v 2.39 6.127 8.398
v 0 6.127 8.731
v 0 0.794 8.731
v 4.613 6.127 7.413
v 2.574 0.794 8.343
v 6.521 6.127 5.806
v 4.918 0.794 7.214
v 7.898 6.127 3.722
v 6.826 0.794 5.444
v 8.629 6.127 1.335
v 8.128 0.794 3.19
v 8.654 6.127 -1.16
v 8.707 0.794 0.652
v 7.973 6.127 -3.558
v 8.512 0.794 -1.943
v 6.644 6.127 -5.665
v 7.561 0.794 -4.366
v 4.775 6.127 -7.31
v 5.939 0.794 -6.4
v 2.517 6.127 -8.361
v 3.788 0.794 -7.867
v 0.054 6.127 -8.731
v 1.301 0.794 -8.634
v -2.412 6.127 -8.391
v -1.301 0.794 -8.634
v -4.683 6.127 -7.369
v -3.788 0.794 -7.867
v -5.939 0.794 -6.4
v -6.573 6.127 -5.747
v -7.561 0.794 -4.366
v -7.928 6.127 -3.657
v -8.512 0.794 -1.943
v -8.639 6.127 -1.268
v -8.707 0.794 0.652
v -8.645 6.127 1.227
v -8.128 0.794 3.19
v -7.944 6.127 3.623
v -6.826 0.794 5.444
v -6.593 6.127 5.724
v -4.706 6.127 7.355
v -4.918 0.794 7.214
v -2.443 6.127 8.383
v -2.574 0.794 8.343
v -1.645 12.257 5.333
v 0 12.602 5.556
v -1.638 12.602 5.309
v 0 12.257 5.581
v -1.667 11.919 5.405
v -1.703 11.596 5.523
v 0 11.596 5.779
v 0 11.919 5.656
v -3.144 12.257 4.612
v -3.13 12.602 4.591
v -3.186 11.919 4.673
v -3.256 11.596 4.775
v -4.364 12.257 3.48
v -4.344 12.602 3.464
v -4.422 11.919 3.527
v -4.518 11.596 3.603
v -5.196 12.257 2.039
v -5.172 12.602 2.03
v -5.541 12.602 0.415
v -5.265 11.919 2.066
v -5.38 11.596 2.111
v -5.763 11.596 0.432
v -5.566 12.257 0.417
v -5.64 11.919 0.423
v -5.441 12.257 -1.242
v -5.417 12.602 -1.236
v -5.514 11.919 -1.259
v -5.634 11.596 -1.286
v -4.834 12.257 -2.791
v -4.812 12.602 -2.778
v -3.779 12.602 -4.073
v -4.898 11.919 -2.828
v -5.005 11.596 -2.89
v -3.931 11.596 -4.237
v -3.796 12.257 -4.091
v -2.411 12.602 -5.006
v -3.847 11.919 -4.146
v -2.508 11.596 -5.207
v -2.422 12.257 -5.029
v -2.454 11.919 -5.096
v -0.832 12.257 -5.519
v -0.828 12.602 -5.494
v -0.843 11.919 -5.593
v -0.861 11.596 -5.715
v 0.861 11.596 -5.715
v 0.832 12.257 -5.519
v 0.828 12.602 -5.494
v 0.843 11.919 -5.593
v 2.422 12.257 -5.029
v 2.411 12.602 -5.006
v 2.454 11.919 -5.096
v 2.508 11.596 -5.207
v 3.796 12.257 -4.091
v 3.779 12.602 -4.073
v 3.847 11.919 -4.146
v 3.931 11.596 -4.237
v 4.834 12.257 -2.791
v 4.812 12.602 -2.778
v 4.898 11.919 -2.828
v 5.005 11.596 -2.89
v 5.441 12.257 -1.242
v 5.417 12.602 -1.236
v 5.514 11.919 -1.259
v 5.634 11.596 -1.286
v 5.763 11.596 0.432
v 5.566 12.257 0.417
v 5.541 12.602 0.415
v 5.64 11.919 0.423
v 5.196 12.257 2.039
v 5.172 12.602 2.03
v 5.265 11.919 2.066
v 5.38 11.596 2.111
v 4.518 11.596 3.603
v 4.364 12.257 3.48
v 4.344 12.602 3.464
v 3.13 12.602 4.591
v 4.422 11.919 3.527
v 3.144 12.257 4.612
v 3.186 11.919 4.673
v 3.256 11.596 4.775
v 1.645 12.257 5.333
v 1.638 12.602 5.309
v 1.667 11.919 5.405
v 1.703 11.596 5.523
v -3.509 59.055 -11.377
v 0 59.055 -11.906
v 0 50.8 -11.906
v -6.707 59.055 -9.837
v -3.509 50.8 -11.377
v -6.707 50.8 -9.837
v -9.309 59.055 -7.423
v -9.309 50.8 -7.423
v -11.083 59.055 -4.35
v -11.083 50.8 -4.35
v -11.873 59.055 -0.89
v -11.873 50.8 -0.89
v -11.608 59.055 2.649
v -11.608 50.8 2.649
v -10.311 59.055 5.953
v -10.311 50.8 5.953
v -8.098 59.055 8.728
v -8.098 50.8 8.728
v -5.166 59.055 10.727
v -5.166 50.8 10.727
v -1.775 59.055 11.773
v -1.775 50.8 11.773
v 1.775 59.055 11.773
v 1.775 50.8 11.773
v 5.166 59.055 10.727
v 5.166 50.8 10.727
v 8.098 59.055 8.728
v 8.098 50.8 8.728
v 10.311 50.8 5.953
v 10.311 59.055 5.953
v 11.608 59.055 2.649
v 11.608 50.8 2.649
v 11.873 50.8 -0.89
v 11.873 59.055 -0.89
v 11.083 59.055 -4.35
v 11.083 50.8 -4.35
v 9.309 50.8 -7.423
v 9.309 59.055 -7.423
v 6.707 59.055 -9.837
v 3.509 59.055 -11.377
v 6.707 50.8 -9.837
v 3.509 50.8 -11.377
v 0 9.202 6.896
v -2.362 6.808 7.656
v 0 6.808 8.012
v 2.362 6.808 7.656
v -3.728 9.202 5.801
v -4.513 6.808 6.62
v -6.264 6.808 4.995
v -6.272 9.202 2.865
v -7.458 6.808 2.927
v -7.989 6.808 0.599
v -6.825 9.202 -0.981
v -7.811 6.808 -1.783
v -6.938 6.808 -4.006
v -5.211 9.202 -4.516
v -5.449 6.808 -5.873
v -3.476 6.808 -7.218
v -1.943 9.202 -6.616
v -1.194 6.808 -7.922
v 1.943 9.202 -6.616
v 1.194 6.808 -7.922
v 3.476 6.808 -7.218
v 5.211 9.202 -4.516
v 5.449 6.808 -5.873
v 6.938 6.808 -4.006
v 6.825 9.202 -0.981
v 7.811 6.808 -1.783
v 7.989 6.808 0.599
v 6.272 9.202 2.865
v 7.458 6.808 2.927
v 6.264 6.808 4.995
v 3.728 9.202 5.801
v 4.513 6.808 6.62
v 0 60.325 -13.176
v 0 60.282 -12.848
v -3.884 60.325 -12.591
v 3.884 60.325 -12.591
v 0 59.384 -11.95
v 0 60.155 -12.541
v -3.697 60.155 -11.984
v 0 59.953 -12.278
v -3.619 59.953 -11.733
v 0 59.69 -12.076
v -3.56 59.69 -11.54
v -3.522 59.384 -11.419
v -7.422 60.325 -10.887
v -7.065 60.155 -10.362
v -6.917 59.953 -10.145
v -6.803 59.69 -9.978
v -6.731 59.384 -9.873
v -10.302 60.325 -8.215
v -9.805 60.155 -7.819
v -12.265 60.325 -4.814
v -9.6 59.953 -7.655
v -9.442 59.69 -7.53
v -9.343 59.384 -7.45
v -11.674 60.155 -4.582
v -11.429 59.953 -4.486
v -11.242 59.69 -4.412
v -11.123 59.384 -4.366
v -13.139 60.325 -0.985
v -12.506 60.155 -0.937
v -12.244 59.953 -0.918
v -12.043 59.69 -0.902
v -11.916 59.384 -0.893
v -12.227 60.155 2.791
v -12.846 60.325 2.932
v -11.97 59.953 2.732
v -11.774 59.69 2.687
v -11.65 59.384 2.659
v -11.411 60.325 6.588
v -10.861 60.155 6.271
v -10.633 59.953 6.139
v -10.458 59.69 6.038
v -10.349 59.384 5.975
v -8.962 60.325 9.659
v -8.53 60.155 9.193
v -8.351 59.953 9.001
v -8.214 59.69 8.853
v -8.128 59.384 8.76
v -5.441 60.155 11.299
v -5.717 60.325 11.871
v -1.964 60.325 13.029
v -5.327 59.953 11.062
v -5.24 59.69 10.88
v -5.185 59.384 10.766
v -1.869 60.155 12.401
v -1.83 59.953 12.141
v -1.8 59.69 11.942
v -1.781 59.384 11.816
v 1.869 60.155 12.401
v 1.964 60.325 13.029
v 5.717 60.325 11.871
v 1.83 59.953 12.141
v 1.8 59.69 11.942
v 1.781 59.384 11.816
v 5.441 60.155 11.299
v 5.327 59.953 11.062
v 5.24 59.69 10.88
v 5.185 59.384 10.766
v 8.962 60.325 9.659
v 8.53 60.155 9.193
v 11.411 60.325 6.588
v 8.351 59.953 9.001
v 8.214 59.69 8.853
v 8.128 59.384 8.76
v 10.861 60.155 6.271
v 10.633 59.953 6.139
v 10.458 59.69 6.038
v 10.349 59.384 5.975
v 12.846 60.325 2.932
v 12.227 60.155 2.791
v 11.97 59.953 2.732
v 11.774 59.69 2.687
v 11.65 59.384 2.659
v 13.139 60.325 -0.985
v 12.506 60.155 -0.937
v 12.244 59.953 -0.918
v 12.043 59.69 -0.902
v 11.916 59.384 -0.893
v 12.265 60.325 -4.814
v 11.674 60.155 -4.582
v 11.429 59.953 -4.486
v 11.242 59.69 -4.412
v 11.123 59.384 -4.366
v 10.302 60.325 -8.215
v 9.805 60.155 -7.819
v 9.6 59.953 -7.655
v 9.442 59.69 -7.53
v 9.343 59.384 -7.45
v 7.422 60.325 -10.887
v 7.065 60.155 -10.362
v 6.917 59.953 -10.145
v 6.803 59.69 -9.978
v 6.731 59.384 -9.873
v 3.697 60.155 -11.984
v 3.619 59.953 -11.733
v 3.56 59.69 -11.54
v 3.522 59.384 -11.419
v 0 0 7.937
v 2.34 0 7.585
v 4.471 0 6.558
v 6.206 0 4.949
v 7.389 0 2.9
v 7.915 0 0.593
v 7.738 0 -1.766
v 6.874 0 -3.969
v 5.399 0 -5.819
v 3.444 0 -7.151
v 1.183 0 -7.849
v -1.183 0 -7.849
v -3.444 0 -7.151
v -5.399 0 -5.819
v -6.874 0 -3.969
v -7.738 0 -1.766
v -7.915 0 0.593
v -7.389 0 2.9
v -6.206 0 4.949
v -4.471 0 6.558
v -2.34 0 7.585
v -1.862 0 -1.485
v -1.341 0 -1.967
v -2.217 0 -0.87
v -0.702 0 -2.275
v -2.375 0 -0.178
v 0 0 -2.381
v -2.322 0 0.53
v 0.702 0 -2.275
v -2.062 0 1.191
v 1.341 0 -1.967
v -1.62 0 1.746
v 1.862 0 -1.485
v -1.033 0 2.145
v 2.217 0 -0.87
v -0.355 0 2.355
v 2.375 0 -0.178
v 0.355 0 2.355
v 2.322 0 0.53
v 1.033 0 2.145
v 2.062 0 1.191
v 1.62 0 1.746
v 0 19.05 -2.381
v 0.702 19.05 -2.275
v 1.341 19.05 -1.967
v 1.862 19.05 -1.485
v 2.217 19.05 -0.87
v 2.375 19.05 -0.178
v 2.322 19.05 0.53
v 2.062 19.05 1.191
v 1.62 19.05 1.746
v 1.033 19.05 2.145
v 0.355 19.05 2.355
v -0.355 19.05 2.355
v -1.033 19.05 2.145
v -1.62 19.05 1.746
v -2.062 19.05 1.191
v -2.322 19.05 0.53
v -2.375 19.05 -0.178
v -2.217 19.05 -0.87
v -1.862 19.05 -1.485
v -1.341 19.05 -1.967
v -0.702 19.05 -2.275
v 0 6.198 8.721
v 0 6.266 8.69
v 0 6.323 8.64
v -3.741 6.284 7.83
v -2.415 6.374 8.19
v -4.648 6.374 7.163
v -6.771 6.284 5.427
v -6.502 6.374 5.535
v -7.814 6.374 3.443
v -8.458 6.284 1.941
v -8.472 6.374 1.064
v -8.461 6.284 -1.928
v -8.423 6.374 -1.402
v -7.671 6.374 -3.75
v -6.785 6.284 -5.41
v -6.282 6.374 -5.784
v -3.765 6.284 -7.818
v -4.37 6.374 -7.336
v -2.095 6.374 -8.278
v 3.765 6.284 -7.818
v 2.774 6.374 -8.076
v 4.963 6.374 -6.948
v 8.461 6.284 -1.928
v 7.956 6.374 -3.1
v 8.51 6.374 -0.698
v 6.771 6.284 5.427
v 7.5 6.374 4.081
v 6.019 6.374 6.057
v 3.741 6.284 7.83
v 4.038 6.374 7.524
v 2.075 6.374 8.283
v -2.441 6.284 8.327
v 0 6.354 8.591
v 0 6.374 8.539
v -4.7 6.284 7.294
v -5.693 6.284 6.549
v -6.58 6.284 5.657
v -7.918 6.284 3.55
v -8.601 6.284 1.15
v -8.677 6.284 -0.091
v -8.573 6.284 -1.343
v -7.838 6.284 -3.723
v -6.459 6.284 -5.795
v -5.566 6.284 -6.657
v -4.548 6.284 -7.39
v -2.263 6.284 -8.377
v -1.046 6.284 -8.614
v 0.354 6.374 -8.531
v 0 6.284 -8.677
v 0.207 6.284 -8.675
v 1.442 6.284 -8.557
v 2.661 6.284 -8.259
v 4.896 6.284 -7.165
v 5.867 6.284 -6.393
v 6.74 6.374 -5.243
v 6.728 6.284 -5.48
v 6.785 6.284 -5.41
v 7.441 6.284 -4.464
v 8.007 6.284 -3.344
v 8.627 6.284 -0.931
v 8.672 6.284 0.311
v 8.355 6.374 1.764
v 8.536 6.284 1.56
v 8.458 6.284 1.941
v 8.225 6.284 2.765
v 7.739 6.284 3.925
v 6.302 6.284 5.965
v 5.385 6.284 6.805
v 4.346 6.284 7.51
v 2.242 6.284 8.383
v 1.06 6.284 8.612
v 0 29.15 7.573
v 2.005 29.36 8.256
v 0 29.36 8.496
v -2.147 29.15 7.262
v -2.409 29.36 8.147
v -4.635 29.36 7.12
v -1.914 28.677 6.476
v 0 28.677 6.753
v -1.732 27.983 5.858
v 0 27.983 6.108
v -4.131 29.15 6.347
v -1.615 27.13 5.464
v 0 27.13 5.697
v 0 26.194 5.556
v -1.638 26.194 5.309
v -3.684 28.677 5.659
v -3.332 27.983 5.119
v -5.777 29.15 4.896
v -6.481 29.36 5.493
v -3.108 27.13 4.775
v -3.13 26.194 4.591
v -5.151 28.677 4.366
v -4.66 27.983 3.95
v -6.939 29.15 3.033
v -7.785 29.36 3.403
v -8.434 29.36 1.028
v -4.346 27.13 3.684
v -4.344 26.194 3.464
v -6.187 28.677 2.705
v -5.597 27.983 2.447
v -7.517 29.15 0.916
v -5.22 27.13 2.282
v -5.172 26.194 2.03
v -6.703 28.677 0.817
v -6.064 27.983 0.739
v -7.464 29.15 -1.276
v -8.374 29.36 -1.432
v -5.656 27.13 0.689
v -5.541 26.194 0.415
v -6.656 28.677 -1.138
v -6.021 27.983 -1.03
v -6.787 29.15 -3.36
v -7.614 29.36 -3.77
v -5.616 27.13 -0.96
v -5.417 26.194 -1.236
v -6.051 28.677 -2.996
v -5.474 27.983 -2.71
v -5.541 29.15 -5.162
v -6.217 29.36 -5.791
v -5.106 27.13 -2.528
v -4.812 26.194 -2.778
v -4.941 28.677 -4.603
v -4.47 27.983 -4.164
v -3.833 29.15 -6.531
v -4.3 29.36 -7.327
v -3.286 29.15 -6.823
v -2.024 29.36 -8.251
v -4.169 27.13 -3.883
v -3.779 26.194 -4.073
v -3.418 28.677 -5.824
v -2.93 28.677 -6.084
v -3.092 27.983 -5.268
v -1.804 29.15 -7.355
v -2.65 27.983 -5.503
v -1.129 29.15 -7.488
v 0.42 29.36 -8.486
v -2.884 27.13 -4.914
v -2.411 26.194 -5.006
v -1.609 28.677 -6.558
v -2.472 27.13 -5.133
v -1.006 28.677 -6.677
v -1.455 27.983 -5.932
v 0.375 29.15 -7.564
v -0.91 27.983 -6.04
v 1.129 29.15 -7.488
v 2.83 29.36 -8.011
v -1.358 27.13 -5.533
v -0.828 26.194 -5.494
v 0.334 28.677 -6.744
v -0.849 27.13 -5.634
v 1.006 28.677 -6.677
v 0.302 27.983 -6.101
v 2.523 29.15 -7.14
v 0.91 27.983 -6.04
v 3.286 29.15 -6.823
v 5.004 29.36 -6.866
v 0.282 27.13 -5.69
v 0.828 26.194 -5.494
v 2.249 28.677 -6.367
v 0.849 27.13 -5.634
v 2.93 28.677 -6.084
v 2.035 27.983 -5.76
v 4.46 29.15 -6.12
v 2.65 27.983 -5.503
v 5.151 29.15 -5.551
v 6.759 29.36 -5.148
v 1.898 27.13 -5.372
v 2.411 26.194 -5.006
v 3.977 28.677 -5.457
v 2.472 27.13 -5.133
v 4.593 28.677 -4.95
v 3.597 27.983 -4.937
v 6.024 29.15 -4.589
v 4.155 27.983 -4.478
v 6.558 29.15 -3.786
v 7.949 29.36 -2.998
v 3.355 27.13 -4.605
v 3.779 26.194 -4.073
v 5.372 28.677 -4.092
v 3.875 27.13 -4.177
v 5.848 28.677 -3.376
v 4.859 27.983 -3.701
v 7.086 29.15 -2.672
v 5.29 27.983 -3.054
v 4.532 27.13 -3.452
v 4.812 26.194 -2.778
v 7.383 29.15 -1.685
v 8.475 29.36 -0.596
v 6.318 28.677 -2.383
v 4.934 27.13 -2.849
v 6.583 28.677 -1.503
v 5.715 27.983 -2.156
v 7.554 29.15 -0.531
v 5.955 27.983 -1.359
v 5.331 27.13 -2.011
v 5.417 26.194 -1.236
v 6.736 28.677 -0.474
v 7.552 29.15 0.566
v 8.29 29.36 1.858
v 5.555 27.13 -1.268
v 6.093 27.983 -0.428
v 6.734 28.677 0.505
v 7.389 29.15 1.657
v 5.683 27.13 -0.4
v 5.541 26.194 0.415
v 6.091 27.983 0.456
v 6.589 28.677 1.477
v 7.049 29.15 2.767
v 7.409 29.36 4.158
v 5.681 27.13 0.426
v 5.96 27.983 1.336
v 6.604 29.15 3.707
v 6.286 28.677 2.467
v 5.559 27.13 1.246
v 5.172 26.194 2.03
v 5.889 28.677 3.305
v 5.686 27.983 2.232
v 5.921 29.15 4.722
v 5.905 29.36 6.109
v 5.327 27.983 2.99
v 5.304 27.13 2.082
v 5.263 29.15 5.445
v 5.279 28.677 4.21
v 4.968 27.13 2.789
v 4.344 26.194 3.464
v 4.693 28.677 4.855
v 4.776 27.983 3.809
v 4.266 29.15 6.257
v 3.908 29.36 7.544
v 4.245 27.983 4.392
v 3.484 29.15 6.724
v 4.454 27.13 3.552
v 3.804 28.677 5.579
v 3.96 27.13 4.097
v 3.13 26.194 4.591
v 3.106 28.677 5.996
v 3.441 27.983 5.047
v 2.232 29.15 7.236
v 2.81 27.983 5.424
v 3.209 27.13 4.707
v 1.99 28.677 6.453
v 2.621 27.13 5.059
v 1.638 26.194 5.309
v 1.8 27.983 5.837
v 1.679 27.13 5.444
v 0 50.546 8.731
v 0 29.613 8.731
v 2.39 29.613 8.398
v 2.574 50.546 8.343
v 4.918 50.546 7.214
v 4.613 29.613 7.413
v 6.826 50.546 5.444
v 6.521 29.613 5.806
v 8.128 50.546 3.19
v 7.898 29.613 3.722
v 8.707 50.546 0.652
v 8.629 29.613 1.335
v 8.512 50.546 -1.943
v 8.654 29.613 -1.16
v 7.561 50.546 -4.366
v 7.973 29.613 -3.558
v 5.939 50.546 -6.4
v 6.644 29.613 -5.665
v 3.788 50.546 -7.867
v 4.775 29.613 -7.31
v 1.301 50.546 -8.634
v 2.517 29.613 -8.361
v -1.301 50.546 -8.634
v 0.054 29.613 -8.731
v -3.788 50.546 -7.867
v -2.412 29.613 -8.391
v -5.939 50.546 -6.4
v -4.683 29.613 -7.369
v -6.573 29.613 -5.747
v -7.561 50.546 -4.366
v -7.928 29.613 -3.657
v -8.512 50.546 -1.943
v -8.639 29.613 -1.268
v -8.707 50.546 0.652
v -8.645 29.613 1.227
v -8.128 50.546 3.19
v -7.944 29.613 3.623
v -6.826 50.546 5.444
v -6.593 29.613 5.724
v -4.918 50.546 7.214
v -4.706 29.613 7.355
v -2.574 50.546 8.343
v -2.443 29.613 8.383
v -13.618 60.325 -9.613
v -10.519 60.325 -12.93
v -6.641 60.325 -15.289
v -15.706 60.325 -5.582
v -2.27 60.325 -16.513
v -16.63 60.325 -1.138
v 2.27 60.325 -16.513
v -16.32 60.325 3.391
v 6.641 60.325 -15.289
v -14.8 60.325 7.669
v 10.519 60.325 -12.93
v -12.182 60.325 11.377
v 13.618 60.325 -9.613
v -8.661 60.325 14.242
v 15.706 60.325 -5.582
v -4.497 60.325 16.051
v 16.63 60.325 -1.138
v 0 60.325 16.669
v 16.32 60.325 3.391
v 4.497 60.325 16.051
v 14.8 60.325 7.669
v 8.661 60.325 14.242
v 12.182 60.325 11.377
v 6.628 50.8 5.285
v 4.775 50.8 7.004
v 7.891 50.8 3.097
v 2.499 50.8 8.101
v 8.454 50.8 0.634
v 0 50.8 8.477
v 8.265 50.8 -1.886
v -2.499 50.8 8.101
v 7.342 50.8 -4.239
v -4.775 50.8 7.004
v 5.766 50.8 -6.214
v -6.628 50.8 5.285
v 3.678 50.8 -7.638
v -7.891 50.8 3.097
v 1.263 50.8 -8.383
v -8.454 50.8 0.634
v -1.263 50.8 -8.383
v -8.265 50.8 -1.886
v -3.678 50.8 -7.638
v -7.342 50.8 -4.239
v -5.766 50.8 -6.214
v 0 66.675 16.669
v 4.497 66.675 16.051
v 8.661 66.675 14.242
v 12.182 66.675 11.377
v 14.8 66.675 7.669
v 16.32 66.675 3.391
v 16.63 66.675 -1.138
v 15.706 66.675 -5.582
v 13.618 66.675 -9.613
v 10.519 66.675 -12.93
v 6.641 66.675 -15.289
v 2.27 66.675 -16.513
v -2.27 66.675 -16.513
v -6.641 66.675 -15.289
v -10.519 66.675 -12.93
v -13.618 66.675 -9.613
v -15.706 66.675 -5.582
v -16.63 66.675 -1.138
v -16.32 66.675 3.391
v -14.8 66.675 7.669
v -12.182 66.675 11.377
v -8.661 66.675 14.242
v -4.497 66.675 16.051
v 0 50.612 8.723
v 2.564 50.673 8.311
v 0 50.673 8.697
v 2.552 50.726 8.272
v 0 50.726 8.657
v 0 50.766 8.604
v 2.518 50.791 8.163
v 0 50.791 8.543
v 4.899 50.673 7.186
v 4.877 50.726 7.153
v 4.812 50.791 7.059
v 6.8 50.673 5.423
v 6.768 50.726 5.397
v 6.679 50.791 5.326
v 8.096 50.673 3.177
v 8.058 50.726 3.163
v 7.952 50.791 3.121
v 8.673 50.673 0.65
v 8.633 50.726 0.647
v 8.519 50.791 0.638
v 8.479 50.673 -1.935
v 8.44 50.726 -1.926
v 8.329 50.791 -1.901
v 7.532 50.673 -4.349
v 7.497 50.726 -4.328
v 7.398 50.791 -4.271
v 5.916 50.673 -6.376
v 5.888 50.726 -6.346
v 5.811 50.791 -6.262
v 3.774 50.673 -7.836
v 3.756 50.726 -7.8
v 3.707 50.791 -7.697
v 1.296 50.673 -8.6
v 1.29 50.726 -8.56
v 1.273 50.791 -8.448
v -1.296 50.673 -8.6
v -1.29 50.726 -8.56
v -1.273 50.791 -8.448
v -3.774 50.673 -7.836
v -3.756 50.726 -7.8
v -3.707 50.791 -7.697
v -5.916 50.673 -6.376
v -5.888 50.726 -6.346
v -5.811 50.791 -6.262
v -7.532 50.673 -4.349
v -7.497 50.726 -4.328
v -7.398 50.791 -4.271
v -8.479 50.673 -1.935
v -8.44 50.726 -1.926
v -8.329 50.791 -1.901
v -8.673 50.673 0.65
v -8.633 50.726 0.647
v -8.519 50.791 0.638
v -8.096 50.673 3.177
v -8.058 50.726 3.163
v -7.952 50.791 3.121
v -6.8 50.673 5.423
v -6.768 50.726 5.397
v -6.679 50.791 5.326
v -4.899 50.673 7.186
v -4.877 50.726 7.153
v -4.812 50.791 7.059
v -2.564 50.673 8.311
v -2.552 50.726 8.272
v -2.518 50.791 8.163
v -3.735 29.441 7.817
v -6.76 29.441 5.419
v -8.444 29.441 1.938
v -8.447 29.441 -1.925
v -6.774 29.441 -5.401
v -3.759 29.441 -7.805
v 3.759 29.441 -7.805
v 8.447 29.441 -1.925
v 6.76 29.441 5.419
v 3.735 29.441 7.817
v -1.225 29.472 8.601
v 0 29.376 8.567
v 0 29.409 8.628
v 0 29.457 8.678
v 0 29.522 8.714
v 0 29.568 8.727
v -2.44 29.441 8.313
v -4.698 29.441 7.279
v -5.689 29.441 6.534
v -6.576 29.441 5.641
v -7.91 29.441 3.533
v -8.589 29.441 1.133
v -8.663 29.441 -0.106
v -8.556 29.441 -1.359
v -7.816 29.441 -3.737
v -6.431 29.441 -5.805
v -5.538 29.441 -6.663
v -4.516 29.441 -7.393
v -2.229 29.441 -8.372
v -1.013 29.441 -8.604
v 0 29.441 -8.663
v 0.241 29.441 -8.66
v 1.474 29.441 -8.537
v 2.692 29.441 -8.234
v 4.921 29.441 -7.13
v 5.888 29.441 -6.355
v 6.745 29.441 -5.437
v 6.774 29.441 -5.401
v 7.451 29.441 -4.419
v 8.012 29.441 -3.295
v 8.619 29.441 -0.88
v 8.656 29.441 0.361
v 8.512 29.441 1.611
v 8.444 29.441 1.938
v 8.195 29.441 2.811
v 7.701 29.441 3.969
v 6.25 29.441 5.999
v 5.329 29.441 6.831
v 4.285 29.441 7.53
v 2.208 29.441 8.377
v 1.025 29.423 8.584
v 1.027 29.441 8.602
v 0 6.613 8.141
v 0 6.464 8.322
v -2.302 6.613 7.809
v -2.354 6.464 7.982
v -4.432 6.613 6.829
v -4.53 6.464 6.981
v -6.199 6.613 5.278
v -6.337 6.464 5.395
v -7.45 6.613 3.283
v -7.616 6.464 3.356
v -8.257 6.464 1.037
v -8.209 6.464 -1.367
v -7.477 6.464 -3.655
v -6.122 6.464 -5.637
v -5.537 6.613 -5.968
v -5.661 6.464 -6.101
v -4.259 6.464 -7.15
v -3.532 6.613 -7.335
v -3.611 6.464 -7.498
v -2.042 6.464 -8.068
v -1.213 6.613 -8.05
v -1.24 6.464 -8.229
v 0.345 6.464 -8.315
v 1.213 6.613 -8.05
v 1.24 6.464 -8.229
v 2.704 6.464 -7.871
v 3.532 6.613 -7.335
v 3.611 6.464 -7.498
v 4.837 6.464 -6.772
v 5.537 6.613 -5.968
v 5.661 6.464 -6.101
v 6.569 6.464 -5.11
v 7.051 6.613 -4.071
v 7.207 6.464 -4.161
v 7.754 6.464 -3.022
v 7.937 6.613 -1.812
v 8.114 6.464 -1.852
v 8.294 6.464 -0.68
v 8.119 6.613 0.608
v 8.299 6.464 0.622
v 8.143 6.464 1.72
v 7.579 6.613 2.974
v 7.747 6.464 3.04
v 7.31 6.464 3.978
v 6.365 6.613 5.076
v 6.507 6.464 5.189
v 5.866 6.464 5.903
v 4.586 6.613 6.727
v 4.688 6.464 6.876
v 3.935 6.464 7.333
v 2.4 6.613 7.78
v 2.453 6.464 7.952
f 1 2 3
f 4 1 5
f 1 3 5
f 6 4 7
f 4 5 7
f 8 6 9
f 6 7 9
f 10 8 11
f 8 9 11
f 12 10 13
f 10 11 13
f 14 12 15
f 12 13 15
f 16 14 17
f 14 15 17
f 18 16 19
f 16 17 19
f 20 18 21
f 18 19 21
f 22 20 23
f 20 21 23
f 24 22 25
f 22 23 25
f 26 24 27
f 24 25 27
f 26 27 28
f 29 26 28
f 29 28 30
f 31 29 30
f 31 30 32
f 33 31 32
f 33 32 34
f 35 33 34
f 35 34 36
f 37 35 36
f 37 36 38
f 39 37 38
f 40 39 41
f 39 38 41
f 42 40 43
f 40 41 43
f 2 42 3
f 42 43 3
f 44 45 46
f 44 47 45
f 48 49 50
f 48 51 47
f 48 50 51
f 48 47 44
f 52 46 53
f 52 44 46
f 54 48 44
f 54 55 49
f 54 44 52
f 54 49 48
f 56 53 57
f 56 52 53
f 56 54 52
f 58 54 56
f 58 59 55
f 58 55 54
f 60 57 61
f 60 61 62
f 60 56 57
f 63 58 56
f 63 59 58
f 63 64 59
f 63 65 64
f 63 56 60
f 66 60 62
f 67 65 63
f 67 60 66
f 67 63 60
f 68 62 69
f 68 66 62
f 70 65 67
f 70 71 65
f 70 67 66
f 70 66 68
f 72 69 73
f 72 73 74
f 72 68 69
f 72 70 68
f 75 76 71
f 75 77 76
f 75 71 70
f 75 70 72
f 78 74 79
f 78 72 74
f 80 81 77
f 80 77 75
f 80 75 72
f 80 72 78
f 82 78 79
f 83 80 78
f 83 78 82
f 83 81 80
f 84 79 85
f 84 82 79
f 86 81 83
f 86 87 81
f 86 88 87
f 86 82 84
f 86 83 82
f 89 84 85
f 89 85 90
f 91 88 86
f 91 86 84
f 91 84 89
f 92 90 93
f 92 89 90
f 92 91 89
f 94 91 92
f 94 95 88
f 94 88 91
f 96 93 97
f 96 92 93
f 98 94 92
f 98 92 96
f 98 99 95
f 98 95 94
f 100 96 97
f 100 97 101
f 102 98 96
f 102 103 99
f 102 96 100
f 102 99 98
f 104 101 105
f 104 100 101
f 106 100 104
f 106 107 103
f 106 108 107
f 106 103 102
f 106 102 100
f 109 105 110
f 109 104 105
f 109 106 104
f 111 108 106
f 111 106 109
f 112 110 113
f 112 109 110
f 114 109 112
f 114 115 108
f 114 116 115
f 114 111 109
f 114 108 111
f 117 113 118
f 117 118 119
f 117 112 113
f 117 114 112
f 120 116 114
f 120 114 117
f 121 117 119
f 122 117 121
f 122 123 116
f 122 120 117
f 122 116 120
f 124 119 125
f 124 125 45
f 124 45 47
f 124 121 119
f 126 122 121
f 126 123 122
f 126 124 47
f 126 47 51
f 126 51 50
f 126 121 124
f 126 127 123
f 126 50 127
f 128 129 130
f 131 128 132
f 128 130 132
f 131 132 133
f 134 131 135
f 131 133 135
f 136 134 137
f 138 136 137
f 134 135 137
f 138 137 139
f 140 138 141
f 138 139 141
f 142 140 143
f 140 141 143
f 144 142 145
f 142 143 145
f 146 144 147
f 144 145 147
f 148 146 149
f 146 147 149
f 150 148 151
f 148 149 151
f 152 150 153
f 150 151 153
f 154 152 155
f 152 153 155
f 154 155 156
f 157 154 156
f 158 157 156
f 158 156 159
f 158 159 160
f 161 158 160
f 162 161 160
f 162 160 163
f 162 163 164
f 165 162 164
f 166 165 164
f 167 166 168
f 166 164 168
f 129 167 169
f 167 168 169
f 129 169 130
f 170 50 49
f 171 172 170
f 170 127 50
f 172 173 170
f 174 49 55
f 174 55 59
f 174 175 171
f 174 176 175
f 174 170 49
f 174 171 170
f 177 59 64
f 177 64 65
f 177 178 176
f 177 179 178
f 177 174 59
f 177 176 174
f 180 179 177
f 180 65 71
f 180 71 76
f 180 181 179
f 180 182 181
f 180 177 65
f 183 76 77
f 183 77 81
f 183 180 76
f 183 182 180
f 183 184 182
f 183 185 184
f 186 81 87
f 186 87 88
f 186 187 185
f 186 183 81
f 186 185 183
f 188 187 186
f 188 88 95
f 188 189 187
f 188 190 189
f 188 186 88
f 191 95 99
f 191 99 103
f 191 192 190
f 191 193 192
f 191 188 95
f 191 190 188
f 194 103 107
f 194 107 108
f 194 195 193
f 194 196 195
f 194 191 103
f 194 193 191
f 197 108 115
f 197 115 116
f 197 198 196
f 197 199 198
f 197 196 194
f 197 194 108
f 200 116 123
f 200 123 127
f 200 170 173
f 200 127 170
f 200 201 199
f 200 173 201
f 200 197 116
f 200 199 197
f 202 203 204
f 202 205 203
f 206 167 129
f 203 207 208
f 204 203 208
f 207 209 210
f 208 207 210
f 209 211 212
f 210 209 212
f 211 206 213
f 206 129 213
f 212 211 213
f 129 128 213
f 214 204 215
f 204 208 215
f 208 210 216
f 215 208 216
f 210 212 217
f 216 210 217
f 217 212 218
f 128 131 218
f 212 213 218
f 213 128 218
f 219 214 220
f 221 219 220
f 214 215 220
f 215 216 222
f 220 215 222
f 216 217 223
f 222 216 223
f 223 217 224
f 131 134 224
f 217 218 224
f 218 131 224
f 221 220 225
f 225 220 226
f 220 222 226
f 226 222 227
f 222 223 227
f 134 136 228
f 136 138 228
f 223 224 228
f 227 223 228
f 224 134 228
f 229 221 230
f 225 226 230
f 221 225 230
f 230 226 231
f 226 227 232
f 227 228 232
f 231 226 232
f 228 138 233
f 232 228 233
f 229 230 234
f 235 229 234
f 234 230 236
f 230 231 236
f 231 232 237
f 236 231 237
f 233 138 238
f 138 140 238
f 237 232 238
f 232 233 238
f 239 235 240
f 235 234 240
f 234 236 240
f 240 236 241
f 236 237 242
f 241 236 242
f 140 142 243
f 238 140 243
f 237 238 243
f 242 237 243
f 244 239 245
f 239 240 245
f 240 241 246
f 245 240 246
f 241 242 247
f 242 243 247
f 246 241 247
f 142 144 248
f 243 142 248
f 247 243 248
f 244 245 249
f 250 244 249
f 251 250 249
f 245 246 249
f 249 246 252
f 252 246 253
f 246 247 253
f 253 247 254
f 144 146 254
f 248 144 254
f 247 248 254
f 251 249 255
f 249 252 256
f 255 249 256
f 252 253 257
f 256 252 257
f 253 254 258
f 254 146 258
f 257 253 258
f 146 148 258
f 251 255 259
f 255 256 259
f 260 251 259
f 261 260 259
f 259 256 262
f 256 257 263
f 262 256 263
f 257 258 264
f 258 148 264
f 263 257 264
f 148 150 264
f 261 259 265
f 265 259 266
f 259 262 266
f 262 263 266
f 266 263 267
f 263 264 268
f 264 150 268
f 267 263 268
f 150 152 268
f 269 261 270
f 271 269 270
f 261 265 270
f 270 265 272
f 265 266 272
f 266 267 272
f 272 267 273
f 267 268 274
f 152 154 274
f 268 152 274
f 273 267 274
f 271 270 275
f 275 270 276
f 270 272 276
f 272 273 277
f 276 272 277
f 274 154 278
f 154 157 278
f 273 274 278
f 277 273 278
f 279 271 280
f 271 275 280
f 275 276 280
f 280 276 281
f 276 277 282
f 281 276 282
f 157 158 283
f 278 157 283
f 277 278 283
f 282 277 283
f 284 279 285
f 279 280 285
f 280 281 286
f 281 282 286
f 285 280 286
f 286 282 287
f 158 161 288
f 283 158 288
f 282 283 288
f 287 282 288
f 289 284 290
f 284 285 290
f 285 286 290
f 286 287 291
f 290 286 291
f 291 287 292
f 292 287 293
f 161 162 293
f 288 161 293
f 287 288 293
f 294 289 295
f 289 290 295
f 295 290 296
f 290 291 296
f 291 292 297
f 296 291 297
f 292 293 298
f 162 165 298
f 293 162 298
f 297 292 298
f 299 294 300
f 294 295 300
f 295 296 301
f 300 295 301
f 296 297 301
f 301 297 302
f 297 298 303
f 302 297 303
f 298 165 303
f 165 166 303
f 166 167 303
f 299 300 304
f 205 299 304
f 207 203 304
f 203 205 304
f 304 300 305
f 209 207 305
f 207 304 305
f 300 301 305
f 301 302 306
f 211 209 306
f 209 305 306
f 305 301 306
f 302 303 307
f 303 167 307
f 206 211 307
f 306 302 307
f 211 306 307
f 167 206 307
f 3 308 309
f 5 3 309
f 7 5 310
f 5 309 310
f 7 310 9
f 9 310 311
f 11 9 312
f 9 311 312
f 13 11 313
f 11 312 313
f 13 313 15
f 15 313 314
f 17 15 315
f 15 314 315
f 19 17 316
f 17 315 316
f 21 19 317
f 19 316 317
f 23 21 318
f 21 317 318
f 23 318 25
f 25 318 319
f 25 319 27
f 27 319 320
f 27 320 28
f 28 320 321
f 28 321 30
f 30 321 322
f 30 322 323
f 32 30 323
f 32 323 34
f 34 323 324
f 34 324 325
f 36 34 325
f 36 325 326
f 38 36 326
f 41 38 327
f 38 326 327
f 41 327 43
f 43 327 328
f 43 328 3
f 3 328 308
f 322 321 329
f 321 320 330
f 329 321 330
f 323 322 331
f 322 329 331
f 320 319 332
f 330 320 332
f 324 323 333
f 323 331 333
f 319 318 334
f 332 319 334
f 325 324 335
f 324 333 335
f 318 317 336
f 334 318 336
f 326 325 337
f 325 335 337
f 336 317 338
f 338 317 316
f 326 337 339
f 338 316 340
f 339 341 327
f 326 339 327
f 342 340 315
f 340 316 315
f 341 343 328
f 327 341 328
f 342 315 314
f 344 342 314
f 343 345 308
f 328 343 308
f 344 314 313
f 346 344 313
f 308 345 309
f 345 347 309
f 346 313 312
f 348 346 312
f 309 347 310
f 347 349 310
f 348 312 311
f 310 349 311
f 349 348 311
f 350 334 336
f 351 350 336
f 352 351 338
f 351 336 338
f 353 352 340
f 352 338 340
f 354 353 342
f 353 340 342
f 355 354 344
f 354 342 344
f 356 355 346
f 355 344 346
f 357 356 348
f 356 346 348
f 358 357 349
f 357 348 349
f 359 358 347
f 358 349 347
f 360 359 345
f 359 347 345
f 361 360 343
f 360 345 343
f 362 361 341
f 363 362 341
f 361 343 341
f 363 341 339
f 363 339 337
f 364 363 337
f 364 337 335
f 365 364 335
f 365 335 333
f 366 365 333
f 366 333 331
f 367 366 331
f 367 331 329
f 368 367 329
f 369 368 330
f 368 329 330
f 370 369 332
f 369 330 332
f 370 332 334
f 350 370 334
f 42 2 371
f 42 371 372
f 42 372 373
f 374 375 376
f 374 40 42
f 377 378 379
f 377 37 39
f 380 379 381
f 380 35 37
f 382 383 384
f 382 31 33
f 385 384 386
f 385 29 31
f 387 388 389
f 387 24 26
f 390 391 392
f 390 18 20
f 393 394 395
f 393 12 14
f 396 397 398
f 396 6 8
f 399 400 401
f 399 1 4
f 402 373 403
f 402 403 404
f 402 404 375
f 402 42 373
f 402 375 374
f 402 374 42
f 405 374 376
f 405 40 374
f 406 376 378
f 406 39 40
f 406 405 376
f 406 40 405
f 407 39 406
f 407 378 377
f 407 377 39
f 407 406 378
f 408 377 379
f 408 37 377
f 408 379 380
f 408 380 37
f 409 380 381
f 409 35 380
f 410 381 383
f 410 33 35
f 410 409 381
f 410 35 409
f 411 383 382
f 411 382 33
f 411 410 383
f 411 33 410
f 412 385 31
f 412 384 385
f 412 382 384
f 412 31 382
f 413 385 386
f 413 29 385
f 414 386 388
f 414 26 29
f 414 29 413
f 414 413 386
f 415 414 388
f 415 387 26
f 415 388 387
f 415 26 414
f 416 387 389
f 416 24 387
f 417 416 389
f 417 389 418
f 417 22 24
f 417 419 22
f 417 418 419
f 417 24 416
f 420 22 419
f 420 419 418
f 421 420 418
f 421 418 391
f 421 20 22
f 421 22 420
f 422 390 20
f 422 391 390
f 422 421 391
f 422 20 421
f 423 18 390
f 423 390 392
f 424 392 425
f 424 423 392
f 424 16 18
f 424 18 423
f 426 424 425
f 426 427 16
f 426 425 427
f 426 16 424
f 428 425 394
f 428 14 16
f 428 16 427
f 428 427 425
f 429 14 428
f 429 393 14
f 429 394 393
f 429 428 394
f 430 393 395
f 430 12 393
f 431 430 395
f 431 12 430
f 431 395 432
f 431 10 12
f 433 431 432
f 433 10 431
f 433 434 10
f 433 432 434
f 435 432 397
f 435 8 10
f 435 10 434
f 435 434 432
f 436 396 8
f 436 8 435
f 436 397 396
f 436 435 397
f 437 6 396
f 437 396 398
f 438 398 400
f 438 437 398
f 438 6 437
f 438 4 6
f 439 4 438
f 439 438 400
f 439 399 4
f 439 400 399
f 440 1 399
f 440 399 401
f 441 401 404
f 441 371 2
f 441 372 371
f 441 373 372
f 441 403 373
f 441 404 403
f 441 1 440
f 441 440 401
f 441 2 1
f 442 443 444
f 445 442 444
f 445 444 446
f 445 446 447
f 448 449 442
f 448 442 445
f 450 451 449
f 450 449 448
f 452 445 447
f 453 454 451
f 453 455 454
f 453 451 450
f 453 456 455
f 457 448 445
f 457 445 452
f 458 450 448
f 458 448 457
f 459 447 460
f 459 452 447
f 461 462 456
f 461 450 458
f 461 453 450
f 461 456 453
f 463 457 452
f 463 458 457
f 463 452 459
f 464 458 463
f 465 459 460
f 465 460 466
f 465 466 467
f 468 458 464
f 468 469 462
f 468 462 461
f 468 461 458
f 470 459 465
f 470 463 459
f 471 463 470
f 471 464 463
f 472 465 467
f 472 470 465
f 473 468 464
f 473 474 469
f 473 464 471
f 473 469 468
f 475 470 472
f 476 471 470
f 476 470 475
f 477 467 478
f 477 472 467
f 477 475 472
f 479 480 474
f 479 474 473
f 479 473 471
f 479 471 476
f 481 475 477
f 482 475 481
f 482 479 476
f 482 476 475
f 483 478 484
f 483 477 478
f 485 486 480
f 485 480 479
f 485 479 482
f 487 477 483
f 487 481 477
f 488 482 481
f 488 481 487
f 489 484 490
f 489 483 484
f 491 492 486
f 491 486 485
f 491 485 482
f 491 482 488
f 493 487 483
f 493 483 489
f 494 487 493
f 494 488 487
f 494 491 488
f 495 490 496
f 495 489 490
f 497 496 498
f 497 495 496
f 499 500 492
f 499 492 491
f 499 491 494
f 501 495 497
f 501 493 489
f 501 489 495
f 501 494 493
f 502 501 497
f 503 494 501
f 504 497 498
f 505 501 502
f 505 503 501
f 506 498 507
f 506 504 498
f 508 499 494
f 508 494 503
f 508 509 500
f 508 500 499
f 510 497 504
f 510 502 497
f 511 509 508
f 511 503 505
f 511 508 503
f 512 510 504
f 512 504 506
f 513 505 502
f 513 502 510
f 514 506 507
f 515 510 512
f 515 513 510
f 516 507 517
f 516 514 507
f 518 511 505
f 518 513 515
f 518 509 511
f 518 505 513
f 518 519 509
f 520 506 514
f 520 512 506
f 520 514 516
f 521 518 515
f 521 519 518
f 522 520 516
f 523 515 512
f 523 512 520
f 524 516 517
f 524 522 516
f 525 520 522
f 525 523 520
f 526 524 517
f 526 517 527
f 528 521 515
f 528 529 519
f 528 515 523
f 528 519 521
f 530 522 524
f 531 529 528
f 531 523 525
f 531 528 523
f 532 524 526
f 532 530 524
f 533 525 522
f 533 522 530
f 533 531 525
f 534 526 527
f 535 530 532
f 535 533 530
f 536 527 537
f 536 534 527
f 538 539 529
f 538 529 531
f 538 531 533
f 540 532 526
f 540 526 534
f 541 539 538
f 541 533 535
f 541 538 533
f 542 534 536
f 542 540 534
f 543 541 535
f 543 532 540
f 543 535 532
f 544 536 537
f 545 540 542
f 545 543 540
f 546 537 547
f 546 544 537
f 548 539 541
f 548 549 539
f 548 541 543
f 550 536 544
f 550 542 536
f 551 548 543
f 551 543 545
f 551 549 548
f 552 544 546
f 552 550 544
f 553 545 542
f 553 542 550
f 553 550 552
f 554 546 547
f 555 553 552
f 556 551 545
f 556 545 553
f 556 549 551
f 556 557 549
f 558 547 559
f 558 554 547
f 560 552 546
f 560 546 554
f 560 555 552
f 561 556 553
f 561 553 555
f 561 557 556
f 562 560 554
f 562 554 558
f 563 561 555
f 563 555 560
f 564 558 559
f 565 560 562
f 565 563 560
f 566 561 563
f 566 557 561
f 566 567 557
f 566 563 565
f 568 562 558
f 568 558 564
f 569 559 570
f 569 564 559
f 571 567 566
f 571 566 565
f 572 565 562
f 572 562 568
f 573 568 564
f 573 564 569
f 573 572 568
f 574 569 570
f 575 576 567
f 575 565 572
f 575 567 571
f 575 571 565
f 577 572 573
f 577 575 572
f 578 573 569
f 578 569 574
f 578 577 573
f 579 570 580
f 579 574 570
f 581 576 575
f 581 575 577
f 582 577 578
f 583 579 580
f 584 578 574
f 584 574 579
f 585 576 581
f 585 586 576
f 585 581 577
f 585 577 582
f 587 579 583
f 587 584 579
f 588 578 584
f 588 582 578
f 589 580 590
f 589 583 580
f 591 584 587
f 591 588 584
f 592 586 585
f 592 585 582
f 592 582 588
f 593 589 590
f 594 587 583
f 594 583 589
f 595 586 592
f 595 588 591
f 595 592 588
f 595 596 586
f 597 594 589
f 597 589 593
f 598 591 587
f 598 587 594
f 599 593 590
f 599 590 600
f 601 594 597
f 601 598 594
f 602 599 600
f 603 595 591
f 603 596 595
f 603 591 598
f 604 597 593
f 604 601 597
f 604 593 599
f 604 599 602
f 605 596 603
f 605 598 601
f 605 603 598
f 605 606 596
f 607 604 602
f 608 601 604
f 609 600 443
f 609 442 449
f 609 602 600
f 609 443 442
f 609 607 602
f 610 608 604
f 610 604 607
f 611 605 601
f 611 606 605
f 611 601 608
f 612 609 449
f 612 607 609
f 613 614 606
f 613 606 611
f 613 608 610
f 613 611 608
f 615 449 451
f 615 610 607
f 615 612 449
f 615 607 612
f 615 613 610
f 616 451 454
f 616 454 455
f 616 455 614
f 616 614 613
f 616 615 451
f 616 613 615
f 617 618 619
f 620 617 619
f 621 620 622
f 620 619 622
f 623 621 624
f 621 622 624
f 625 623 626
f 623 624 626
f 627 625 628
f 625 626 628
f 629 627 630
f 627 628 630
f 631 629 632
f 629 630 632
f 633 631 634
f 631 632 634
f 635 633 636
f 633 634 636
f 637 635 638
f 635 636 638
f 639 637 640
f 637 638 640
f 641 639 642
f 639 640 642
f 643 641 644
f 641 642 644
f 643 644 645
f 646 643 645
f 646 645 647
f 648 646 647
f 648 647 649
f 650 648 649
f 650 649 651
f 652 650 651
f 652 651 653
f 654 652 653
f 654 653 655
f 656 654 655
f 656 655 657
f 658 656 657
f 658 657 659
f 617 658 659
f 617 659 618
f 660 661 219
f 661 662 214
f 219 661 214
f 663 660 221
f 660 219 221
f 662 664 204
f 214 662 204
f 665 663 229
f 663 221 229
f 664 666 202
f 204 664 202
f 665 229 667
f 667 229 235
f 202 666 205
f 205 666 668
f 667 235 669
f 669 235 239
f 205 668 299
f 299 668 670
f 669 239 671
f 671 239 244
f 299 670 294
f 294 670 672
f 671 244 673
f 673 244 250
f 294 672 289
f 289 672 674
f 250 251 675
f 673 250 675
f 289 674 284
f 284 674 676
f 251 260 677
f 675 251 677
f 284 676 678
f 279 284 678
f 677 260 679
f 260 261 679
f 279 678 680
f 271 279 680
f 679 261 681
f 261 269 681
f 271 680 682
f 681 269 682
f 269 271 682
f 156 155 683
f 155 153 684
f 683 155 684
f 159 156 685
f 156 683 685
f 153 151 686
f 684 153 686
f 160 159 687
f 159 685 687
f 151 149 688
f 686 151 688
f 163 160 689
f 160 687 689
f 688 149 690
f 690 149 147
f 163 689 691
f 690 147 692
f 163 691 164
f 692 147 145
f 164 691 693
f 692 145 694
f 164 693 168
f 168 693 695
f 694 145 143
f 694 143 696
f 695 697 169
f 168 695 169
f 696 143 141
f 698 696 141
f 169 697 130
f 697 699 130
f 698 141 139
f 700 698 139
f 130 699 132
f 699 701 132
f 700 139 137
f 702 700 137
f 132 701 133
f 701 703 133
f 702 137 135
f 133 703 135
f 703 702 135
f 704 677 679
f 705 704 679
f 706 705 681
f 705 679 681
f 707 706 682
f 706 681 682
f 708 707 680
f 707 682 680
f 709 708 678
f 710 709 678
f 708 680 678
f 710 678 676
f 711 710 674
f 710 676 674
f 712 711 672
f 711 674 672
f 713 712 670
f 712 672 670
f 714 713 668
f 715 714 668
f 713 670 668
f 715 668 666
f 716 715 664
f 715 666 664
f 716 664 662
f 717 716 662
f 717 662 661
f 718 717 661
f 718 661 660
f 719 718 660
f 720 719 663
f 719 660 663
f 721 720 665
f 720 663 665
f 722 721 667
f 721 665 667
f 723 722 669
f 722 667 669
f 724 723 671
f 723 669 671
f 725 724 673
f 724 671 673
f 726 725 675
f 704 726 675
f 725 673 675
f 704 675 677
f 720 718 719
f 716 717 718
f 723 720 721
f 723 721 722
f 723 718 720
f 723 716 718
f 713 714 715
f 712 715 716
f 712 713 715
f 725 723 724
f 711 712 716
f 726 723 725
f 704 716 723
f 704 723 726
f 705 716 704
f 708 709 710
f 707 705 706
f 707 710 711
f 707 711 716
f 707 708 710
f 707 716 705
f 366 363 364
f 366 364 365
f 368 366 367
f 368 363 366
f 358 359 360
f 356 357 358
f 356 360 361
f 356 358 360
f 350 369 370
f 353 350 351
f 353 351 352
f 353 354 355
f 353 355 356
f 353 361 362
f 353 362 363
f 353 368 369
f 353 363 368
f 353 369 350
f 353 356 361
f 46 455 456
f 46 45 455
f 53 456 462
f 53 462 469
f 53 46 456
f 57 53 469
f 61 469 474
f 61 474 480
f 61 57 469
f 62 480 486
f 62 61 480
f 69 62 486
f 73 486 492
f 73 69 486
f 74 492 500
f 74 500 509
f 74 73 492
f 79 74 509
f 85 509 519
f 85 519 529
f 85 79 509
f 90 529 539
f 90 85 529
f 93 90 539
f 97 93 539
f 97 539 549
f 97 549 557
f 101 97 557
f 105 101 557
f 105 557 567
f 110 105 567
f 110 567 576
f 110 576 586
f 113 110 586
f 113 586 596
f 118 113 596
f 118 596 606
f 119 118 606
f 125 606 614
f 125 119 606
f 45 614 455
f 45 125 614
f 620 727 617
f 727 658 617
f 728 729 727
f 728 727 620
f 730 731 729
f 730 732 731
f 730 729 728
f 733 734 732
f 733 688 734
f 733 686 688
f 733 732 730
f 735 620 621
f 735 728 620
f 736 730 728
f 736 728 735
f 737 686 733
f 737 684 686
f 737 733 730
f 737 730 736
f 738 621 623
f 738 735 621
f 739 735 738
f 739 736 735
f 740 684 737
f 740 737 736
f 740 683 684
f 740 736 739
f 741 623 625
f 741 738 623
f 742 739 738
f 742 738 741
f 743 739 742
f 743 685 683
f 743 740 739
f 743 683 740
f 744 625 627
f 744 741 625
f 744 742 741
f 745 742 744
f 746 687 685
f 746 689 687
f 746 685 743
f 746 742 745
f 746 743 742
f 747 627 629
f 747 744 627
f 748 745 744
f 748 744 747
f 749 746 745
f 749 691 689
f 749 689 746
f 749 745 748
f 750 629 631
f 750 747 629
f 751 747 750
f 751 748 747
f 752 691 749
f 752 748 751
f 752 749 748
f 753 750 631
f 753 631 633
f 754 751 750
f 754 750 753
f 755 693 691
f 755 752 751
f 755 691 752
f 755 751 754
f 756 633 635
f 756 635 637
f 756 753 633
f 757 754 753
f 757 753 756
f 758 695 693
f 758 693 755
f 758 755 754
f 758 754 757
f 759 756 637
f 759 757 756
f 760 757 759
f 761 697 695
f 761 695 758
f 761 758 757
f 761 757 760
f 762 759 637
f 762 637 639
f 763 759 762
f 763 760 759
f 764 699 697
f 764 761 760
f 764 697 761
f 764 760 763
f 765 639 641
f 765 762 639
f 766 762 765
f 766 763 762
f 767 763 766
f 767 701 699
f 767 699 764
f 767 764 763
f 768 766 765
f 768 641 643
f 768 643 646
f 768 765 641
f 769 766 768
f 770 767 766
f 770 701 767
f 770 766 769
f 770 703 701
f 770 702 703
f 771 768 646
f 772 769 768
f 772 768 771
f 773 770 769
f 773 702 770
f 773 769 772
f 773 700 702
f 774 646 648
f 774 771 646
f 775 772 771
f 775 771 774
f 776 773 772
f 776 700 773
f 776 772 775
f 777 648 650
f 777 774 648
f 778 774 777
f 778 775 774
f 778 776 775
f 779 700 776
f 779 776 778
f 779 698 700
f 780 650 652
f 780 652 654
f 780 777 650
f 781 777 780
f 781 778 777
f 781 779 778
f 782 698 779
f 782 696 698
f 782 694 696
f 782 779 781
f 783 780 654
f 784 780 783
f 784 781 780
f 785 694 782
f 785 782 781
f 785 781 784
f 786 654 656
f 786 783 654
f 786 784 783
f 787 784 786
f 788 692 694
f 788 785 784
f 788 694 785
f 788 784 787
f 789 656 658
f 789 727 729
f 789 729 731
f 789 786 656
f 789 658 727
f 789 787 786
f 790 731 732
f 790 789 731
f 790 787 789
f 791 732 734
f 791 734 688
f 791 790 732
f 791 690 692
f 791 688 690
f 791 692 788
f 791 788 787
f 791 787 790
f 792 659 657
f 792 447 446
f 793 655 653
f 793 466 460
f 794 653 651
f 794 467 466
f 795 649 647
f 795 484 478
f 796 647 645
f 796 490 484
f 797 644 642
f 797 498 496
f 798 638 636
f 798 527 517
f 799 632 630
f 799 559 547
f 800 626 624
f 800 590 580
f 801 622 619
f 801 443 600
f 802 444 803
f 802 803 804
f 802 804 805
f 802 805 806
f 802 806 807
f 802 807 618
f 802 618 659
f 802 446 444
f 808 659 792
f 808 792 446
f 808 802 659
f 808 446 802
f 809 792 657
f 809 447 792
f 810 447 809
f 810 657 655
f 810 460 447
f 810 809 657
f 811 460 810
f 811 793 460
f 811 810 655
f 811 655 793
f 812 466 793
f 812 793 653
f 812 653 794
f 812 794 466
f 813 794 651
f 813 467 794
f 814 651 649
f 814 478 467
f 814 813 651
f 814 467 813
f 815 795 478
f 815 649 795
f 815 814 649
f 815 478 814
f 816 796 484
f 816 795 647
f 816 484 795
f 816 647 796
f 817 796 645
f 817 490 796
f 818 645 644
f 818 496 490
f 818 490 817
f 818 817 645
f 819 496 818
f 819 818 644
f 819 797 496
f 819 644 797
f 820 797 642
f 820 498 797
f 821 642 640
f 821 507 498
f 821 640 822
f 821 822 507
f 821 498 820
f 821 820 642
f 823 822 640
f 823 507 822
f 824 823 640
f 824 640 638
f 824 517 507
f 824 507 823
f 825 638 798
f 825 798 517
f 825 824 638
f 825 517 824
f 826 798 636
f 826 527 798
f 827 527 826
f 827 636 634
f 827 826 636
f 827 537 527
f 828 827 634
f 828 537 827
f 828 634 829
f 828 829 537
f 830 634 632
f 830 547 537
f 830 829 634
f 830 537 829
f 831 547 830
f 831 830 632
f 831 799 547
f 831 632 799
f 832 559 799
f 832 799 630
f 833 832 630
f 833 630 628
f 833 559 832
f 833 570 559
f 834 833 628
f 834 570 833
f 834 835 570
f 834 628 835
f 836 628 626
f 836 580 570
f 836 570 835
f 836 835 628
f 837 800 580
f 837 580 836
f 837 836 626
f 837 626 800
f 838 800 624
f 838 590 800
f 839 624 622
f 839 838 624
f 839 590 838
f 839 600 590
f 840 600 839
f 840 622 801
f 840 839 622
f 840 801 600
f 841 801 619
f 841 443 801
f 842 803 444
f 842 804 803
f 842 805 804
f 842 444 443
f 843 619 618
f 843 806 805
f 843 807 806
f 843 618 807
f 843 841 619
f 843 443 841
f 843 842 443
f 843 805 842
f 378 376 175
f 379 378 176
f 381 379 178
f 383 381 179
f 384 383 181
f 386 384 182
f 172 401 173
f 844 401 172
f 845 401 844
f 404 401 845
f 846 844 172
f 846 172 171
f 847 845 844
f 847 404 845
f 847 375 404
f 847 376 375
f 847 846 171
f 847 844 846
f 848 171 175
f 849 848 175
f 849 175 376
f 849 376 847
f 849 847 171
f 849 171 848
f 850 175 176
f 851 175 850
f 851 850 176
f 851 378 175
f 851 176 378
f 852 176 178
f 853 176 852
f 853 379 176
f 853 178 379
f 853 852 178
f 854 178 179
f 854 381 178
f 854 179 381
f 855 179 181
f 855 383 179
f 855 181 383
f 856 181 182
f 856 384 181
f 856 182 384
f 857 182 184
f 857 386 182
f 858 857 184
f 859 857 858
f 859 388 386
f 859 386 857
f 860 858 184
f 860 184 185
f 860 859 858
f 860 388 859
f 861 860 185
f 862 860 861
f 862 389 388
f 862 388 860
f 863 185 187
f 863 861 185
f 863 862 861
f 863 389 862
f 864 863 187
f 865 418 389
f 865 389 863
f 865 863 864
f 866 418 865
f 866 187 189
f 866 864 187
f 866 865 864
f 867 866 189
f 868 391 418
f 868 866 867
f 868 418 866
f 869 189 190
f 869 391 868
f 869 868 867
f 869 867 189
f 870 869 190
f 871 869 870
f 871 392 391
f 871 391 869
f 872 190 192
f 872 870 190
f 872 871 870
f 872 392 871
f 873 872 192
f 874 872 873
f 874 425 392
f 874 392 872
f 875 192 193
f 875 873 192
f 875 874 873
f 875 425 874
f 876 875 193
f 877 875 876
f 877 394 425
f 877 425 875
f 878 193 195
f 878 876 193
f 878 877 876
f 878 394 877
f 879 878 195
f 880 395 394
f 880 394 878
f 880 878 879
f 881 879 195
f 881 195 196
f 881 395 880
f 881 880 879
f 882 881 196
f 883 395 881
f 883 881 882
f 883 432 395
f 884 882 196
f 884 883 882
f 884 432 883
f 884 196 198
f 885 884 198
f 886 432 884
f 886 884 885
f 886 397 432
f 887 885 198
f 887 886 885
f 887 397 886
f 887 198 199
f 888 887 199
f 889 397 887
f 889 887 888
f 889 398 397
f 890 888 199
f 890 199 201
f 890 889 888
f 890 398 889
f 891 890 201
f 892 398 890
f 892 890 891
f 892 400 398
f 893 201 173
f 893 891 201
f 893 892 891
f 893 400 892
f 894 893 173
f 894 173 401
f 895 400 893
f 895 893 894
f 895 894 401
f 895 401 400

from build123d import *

# Parameters (mm, degrees)
SKETCH1_R               = 8.73125
MAIN_DEPTH              = 50.8
CHAMFER1_SIZE           = 0.79375
FILLET1_R               = 0.254
SKETCH6_R               = 11.90625
SPRING_STABILIZER_DEPTH = 9.525
SKETCH3_R               = 16.66875
TOP_CAP_DEPTH           = 6.35
FILLET2_R               = 1.27
SKETCH7_R               = 2.38125
CUT_EXTRUDE1_DEPTH      = 19.05


with BuildPart() as part:
    # Sketch1 → main (new body)
    with BuildSketch(Plane(origin=(0, 0, 0), x_dir=(1, 0, 0), z_dir=(0, 1, 0))):
        with Locations(Location((0, 0, 0), (0, 0, 270))):
            Circle(SKETCH1_R)
    extrude(amount=MAIN_DEPTH)

    # Chamfer1
    chamfer1_edges = [part.edges().sort_by_distance(p)[0] for p in [
        (0, 0, -8.73125),
    ]]
    chamfer(chamfer1_edges, length=CHAMFER1_SIZE)

    # Sketch2 → ball_channel (revolve, cut)
    with BuildSketch(Plane(origin=(0, 0, 0), x_dir=(0, 0, -1), z_dir=(1, 0, 0))):
        with BuildLine():
            Line((-5.779354582, 11.595937646), (-8.011868194, 6.808296755))
            ThreePointArc((-8.011868194, 6.808296755), (-8.304768436, 6.47430804), (-8.73125, 6.35))
            Line((-8.73125, 6.35), (-8.73125, 29.36875))
            ThreePointArc((-8.73125, 29.36875), (-6.48618597, 28.43881403), (-5.55625, 26.19375))
            Line((-5.55625, 26.19375), (-5.55625, 12.602297381))
            ThreePointArc((-5.55625, 12.602297381), (-5.612695133, 12.086900551), (-5.779354582, 11.595937646))
        make_face()
    revolve(axis=Axis((0, 50.8, 0), (0, -1, 0)), mode=Mode.SUBTRACT)

    # Fillet1
    fillet1_edges = [part.edges().sort_by_distance(p)[0] for p in [
        (0, 6.35, -8.73125),
        (0, 29.36875, -8.73125),
        (0, 50.8, -8.73125),
    ]]
    fillet(fillet1_edges, radius=FILLET1_R)

    # Sketch6 → spring_stabilizer (add)
    with BuildSketch(Plane(origin=(0, 50.8, 0), x_dir=(1, 0, 0), z_dir=(0, 1, 0))):
        with Locations(Location((0, 0, 0), (0, 0, 90))):
            Circle(SKETCH6_R)
    extrude(amount=SPRING_STABILIZER_DEPTH)

    # Sketch3 → top_cap (add)
    with BuildSketch(Plane(origin=(0, 60.325, 0), x_dir=(1, 0, 0), z_dir=(0, 1, 0))):
        with Locations(Location((0, 0, 0), (0, 0, 270))):
            Circle(SKETCH3_R)
    extrude(amount=TOP_CAP_DEPTH)

    # Fillet2
    fillet2_edges = [part.edges().sort_by_distance(p)[0] for p in [
        (0, 60.325, 11.90625),
    ]]
    fillet(fillet2_edges, radius=FILLET2_R)

    # Sketch7 → Cut-Extrude1 (cut)
    with BuildSketch(Plane.XZ):
        with Locations(Location((0, 0, 0), (0, 0, 270))):
            Circle(SKETCH7_R)
    extrude(amount=-CUT_EXTRUDE1_DEPTH, mode=Mode.SUBTRACT)


solid = part.part
